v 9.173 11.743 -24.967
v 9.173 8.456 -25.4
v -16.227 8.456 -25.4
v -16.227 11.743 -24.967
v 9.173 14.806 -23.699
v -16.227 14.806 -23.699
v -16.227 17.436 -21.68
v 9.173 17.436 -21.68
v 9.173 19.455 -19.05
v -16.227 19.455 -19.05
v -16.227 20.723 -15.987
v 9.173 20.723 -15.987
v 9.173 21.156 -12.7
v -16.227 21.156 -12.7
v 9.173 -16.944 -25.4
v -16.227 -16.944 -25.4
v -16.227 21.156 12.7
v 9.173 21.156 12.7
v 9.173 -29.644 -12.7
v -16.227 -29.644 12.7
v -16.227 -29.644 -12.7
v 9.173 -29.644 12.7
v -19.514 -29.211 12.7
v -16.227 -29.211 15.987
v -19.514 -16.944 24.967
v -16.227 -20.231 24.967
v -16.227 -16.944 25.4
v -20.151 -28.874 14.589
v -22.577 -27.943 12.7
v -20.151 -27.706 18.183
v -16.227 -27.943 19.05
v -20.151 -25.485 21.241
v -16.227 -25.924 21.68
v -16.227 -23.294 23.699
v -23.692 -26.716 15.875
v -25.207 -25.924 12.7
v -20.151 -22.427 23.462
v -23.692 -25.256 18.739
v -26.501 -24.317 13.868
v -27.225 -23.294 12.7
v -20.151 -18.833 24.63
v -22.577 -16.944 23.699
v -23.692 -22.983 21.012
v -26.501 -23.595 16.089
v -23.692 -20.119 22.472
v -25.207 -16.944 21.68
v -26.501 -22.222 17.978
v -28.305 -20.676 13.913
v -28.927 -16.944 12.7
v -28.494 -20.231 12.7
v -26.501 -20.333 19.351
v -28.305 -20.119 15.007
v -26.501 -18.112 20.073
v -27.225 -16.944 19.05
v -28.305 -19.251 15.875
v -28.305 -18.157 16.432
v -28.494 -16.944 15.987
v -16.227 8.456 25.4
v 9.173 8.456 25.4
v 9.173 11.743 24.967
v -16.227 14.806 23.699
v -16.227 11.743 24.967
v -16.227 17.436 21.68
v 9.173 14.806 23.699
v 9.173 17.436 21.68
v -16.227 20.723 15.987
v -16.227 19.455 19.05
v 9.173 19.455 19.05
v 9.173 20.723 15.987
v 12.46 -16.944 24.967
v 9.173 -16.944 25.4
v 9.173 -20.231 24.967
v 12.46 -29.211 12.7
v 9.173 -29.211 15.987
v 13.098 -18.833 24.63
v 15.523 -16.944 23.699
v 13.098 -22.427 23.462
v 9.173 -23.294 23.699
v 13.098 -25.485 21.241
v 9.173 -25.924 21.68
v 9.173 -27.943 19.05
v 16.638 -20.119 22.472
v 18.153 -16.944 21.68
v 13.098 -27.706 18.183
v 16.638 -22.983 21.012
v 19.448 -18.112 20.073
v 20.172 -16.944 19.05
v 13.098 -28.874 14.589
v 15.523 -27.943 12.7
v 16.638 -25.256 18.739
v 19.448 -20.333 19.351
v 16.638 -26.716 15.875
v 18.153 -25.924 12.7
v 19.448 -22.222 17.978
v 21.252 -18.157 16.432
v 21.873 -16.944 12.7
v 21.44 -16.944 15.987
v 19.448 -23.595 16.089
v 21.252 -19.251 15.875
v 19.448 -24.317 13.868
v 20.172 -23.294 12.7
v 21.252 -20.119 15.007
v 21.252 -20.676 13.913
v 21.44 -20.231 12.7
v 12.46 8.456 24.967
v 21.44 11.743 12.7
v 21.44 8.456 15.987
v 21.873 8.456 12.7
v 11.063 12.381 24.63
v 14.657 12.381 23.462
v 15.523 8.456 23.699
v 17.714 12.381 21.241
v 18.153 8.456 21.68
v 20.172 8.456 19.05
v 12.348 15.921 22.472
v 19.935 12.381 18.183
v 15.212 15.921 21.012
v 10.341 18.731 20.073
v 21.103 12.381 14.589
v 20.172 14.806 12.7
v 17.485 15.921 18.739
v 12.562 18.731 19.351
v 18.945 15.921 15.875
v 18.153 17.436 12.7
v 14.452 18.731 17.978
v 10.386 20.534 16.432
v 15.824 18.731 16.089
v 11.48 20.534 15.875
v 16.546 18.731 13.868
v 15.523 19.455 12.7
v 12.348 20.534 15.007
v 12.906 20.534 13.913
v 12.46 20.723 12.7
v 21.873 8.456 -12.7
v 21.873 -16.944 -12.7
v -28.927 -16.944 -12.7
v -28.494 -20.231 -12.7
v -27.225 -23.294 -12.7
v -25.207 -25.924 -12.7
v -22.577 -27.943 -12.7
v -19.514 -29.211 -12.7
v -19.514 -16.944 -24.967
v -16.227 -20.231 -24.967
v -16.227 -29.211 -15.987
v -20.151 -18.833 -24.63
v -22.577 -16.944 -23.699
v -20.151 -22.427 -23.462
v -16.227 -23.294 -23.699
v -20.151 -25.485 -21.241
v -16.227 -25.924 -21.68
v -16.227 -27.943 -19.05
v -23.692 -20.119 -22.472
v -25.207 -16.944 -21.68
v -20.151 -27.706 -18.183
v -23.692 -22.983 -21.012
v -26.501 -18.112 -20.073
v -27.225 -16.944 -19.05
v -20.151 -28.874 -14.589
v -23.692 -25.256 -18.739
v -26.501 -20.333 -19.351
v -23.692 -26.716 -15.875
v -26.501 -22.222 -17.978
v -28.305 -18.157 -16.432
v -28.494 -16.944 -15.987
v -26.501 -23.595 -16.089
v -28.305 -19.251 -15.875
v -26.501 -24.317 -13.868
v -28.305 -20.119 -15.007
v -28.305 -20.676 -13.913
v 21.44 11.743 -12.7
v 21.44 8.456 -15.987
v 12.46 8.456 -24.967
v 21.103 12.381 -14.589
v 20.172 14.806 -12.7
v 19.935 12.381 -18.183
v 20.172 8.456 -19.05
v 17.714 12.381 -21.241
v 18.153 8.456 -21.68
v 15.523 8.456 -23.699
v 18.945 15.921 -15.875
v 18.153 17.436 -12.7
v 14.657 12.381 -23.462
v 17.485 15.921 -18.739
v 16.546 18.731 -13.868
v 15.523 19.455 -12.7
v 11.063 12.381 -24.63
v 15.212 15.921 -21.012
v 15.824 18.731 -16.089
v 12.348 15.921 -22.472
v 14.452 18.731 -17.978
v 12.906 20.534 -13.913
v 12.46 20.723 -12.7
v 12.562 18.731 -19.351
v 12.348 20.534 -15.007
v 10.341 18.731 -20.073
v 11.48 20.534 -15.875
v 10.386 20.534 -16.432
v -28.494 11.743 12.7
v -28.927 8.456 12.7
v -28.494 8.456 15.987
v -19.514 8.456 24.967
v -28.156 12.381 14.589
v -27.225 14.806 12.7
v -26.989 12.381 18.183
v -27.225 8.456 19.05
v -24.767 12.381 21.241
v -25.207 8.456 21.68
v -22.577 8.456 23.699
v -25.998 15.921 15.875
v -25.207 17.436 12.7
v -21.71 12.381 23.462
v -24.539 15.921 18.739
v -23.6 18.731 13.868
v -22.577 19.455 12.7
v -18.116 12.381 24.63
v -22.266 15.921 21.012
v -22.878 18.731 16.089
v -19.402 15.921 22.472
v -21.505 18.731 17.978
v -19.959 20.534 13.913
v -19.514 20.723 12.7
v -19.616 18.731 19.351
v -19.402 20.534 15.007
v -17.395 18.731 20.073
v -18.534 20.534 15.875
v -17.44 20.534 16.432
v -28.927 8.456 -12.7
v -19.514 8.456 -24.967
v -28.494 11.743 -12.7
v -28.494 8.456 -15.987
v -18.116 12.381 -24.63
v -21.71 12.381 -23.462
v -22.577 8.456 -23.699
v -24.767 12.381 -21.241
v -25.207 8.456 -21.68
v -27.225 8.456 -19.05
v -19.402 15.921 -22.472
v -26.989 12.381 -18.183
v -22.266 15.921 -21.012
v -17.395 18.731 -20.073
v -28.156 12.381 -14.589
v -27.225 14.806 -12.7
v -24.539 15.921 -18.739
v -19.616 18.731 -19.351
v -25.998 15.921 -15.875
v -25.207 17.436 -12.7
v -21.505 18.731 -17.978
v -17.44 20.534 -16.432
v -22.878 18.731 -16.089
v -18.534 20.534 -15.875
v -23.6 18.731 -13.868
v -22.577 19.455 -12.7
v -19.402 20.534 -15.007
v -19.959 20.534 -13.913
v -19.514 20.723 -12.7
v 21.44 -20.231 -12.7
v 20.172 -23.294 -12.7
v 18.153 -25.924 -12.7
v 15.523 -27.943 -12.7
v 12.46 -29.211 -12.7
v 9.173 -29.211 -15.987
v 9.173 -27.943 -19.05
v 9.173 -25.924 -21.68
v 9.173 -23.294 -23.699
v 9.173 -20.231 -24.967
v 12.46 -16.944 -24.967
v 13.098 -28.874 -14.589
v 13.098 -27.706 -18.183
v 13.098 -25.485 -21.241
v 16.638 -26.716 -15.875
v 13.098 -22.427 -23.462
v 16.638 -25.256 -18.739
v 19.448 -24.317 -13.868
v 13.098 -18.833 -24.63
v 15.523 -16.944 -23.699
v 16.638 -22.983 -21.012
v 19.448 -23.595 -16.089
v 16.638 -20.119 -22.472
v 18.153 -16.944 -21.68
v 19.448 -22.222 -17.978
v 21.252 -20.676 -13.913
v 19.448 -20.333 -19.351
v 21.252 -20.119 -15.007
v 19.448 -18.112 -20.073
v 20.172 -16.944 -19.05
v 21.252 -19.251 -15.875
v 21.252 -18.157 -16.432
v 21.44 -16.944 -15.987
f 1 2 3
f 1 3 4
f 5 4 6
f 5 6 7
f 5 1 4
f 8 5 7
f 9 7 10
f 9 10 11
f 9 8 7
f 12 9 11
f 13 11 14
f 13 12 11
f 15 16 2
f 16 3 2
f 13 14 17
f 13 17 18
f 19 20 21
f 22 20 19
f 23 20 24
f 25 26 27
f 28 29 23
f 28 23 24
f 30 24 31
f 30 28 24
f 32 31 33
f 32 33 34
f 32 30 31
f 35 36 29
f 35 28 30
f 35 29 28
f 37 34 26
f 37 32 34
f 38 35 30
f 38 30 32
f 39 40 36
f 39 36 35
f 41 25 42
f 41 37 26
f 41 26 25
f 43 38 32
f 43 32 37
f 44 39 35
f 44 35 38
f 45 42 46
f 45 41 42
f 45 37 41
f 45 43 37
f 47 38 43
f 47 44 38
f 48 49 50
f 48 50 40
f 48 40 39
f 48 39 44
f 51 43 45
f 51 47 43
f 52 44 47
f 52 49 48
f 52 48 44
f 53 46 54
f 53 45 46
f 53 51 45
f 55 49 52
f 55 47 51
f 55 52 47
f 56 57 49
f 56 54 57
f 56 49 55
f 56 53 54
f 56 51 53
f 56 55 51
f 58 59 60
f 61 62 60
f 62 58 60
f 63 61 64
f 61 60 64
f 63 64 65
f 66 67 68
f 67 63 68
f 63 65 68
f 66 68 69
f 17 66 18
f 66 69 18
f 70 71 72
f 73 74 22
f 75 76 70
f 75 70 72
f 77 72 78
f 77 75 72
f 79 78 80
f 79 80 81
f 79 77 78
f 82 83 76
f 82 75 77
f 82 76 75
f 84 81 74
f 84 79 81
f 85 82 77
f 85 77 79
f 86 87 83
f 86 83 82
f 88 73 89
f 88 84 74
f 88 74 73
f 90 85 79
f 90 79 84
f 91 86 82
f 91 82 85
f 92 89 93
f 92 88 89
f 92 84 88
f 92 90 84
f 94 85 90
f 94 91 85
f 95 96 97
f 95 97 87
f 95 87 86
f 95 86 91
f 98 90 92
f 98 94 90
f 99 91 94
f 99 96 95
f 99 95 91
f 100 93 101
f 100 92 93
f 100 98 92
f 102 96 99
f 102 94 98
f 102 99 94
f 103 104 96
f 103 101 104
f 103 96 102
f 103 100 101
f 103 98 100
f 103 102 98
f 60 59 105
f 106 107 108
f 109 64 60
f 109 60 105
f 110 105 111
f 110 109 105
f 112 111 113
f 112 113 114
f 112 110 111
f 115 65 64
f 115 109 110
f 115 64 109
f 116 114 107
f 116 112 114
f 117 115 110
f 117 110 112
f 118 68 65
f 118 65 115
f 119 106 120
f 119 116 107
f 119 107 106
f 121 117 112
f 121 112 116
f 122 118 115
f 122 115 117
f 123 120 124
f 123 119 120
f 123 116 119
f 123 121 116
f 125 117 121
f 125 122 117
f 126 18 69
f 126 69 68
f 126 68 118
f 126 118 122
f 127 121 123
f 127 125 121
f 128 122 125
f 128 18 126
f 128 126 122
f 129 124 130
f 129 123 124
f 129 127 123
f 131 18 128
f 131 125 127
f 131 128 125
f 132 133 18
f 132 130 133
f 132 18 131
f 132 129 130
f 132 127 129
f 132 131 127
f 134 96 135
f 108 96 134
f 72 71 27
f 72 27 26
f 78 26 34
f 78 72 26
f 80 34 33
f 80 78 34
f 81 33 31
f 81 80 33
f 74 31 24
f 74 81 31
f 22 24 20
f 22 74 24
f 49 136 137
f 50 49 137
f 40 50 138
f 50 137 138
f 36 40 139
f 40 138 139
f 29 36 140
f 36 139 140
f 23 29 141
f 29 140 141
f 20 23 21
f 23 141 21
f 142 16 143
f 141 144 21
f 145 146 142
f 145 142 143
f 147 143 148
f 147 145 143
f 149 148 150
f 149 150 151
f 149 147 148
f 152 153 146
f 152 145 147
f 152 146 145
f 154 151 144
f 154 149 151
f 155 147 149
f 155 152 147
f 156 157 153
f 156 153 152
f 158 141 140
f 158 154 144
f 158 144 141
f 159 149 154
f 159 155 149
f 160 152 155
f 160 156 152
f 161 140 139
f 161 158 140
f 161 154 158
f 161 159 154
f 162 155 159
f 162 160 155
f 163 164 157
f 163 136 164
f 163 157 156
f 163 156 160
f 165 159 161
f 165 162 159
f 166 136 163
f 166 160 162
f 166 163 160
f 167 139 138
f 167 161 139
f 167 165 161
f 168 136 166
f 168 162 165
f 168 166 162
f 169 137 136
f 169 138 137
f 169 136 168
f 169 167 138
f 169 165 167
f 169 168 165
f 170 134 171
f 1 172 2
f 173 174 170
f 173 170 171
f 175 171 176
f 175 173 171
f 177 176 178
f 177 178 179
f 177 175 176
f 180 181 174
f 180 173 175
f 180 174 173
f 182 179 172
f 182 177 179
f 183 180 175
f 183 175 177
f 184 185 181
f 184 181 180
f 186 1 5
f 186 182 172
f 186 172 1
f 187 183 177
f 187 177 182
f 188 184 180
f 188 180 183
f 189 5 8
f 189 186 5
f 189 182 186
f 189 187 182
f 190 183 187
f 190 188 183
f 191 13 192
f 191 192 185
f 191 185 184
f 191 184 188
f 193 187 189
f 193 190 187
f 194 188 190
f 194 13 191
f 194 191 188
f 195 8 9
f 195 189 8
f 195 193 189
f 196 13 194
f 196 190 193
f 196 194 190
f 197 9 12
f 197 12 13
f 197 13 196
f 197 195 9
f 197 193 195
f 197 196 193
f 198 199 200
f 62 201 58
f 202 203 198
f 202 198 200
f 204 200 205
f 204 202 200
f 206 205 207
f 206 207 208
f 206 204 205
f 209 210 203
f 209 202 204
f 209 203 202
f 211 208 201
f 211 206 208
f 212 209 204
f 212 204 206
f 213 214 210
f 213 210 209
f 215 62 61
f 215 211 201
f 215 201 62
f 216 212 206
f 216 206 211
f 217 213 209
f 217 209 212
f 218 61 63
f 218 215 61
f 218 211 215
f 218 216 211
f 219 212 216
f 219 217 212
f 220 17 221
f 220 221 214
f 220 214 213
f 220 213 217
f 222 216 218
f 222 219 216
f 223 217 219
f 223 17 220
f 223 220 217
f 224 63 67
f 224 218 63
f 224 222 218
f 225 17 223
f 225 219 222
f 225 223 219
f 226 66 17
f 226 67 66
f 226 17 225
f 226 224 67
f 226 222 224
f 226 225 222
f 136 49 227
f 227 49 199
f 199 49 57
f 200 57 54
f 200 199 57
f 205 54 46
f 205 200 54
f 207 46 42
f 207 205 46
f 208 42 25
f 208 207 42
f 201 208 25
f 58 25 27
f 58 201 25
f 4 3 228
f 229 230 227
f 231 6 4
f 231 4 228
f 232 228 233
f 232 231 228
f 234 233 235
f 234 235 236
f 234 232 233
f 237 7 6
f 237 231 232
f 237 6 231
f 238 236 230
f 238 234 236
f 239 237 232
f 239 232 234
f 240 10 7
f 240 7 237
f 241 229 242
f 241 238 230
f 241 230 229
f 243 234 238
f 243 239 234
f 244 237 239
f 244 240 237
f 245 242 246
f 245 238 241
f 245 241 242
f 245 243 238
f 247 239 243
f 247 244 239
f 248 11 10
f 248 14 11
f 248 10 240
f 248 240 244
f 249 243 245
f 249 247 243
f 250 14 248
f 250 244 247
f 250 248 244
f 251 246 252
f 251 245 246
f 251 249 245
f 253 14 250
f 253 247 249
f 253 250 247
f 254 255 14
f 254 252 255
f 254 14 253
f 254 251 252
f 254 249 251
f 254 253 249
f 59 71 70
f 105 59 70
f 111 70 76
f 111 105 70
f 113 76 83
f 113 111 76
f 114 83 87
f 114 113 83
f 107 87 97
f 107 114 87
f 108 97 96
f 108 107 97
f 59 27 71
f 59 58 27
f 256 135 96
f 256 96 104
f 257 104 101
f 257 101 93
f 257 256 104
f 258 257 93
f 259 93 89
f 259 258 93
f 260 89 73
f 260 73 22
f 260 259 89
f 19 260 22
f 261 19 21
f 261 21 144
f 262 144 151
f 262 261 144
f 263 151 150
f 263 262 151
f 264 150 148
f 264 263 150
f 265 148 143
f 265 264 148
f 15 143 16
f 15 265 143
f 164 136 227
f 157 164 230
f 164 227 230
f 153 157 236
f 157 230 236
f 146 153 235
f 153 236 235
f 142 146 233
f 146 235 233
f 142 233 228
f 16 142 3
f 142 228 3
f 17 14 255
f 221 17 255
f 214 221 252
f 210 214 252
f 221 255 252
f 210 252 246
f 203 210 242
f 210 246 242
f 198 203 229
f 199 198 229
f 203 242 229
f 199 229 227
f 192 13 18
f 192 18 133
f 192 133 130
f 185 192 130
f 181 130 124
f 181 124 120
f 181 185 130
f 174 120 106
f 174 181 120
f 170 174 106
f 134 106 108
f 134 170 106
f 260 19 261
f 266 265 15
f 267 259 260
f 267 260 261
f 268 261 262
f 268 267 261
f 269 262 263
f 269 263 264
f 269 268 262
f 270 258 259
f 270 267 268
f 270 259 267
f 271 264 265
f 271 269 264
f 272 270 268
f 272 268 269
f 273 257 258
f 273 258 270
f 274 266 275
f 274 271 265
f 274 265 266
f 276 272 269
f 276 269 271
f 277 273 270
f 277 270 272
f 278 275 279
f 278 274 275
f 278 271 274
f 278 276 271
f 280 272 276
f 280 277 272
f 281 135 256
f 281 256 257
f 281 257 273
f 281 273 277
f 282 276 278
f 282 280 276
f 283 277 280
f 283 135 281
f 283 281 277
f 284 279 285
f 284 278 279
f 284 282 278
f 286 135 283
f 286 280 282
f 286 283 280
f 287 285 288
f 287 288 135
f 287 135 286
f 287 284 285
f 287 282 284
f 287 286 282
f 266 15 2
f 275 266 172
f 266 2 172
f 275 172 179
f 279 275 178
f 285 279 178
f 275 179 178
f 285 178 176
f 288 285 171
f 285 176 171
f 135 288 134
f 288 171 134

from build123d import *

# Parameters (mm, degrees)
F0_W         = 50.8
F0_H         = 50.8
F1_DEPTH     = 25.4
F2_DEPTH     = 25.4
F3_R         = 12.7
F4_R         = 12.7
F5_T1_DEPTH  = 25.4
F5_S5_W      = 12.7
F5_S5_H      = 12.7
F5_T6_DEPTH  = 12.7
F5_S11_W     = 12.7
F5_S11_H     = 12.7
F5_T12_DEPTH = 12.7
F5_S17_W     = 12.7
F5_S17_H     = 12.7
F5_T18_DEPTH = 12.7
F5_S23_W     = 12.7
F5_S23_H     = 12.7
F5_T24_DEPTH = 12.7
F5_S29_W     = 12.7
F5_S29_H     = 12.7
F5_T30_DEPTH = 12.7
F5_S35_W     = 12.7
F5_S35_H     = 12.7
F5_T36_DEPTH = 12.7
F5_S41_W     = 12.7
F5_S41_H     = 12.7
F5_T42_DEPTH = 12.7
F5_S47_W     = 12.7
F5_S47_H     = 12.7
F5_T48_DEPTH = 12.7


# Not quite as in the source:
# - a fillet or chamfer that OpenCascade refuses, or shapes differently, is made with other operations: its cross-section is extruded or revolved along the edge and cut away or added


with BuildPart() as f1:
    # F0 (on Top) → F1 (new body)
    with BuildSketch(Plane.XY):
        with Locations((-3.5267624348, -4.2439938247)):
            Rectangle(F0_W, F0_H)
    extrude(amount=F1_DEPTH)

    # F2 (add): a face of the model
    f2_faces = [f1.faces().sort_by_distance(p)[0] for p in [
        (-3.5267624348, -4.2439938247, 0),
    ]]
    extrude(f2_faces, amount=F2_DEPTH)

    # F3
    f3_edges = [f1.edges().sort_by_distance(p)[0] for p in [
        (-3.526762, -29.643994, 25.4),
        (-28.926762, -4.243994, 25.4),
        (-3.526762, 21.156006, 25.4),
        (21.873238, -4.243994, 25.4),
    ]]
    fillet(f3_edges, radius=F3_R)

    # F4
    f4_edges = [f1.edges().sort_by_distance(p)[0] for p in [
        (-3.526762, -29.643994, -25.4),
        (-28.926762, -4.243994, -25.4),
        (-3.526762, 21.156006, -25.4),
        (21.873238, -4.243994, -25.4),
    ]]
    fillet(f4_edges, radius=F4_R)

    # F5: fillet of radius 12.7 on 4 edges, made by hand

    # F5_s2 → F5_t1 (cut)
    with BuildSketch(Plane.XY.offset(-12.7)):
        with BuildLine():
            ThreePointArc((-28.9267624348, -16.9439938247), (-25.2070185559, -25.9242499458), (-16.2267624348, -29.6439938247))
            Line((-16.2267624348, -29.6439938247), (-28.9267624348, -29.6439938247))
            Line((-28.9267624348, -29.6439938247), (-28.9267624348, -16.9439938247))
        make_face()
        with BuildLine():
            ThreePointArc((-16.2267624348, 21.1560061753), (-25.2070185559, 17.4362622963), (-28.9267624348, 8.4560061753))
            Line((-28.9267624348, 8.4560061753), (-28.9267624348, 21.1560061753))
            Line((-28.9267624348, 21.1560061753), (-16.2267624348, 21.1560061753))
        make_face()
        with BuildLine():
            ThreePointArc((9.1732375652, 21.1560061753), (18.1534936862, 17.4362622963), (21.8732375652, 8.4560061753))
            Line((21.8732375652, 8.4560061753), (21.8732375652, 21.1560061753))
            Line((21.8732375652, 21.1560061753), (9.1732375652, 21.1560061753))
        make_face()
        with BuildLine():
            ThreePointArc((21.8732375652, -16.9439938247), (18.1534936862, -25.9242499458), (9.1732375652, -29.6439938247))
            Line((9.1732375652, -29.6439938247), (21.8732375652, -29.6439938247))
            Line((21.8732375652, -29.6439938247), (21.8732375652, -16.9439938247))
        make_face()
    extrude(amount=F5_T1_DEPTH, mode=Mode.SUBTRACT)


with BuildPart() as f5_tool4:
    # F5_s5 → F5_t6 (new body)
    with BuildSketch(Plane.YZ.offset(9.1732375652)):
        with Locations((-23.2939938247, 19.05)):
            Rectangle(F5_S5_W, F5_S5_H)
    extrude(amount=F5_T6_DEPTH)

    # F5_s7 → F5_t8 (revolve, cut)
    with BuildSketch(Plane(origin=(9.1732375652, -16.9439938247, 12.7), x_dir=(0, 0.7071067812, -0.7071067812), z_dir=(0, -0.7071067812, -0.7071067812))):
        with BuildLine():
            ThreePointArc((0, -12.7), (12.7, 0), (0, 12.7))
            Line((0, 12.7), (0, -12.7))
        make_face()
    revolve(axis=Axis((9.1732375652, -16.9439938247, 12.7), (1, 0, 0)), mode=Mode.SUBTRACT)


with BuildPart() as f1_1:
    add(f1.part)

    # F5_t3: cut F5_tool4
    add(f5_tool4.part, mode=Mode.SUBTRACT)


with BuildPart() as f5_tool10:
    # F5_s11 → F5_t12 (new body)
    with BuildSketch(Plane.YZ.offset(9.1732375652)):
        with Locations((-23.2939938247, -19.05)):
            Rectangle(F5_S11_W, F5_S11_H)
    extrude(amount=F5_T12_DEPTH)

    # F5_s13 → F5_t14 (revolve, cut)
    with BuildSketch(Plane(origin=(9.1732375652, -16.9439938247, -12.7), x_dir=(0, 0.7071067812, 0.7071067812), z_dir=(0, 0.7071067812, -0.7071067812))):
        with BuildLine():
            ThreePointArc((0, -12.7), (12.7, 0), (0, 12.7))
            Line((0, 12.7), (0, -12.7))
        make_face()
    revolve(axis=Axis((9.1732375652, -16.9439938247, -12.7), (1, 0, 0)), mode=Mode.SUBTRACT)


with BuildPart() as f1_2:
    add(f1_1.part)

    # F5_t9: cut F5_tool10
    add(f5_tool10.part, mode=Mode.SUBTRACT)


with BuildPart() as f5_tool16:
    # F5_s17 → F5_t18 (new body)
    with BuildSketch(Plane.XZ.offset(-8.4560061753)):
        with Locations((15.5232375652, 19.05)):
            Rectangle(F5_S17_W, F5_S17_H)
    extrude(amount=-F5_T18_DEPTH)

    # F5_s19 → F5_t20 (revolve, cut)
    with BuildSketch(Plane(origin=(9.1732375652, 8.4560061753, 12.7), x_dir=(-0.7071067812, 0, -0.7071067812), z_dir=(0.7071067812, 0, -0.7071067812))):
        with BuildLine():
            ThreePointArc((0, -12.7), (12.7, 0), (0, 12.7))
            Line((0, 12.7), (0, -12.7))
        make_face()
    revolve(axis=Axis((9.1732375652, 8.4560061753, 12.7), (0, 1, 0)), mode=Mode.SUBTRACT)


with BuildPart() as f1_3:
    add(f1_2.part)

    # F5_t15: cut F5_tool16
    add(f5_tool16.part, mode=Mode.SUBTRACT)


with BuildPart() as f5_tool22:
    # F5_s23 → F5_t24 (new body)
    with BuildSketch(Plane.XZ.offset(-8.4560061753)):
        with Locations((15.5232375652, -19.05)):
            Rectangle(F5_S23_W, F5_S23_H)
    extrude(amount=-F5_T24_DEPTH)

    # F5_s25 → F5_t26 (revolve, cut)
    with BuildSketch(Plane(origin=(9.1732375652, 8.4560061753, -12.7), x_dir=(-0.7071067812, 0, 0.7071067812), z_dir=(-0.7071067812, 0, -0.7071067812))):
        with BuildLine():
            ThreePointArc((0, -12.7), (12.7, 0), (0, 12.7))
            Line((0, 12.7), (0, -12.7))
        make_face()
    revolve(axis=Axis((9.1732375652, 8.4560061753, -12.7), (0, 1, 0)), mode=Mode.SUBTRACT)


with BuildPart() as f1_4:
    add(f1_3.part)

    # F5_t21: cut F5_tool22
    add(f5_tool22.part, mode=Mode.SUBTRACT)


with BuildPart() as f5_tool28:
    # F5_s29 → F5_t30 (new body)
    with BuildSketch(Plane.XZ.offset(-8.4560061753)):
        with Locations((-22.5767624348, -19.05)):
            Rectangle(F5_S29_W, F5_S29_H)
    extrude(amount=-F5_T30_DEPTH)

    # F5_s31 → F5_t32 (revolve, cut)
    with BuildSketch(Plane(origin=(-16.2267624348, 8.4560061753, -12.7), x_dir=(0.7071067812, 0, 0.7071067812), z_dir=(-0.7071067812, 0, 0.7071067812))):
        with BuildLine():
            ThreePointArc((0, -12.7), (12.7, 0), (0, 12.7))
            Line((0, 12.7), (0, -12.7))
        make_face()
    revolve(axis=Axis((-16.2267624348, 8.4560061753, -12.7), (0, 1, 0)), mode=Mode.SUBTRACT)


with BuildPart() as f1_5:
    add(f1_4.part)

    # F5_t27: cut F5_tool28
    add(f5_tool28.part, mode=Mode.SUBTRACT)


with BuildPart() as f5_tool34:
    # F5_s35 → F5_t36 (new body)
    with BuildSketch(Plane.XZ.offset(-8.4560061753)):
        with Locations((-22.5767624348, 19.05)):
            Rectangle(F5_S35_W, F5_S35_H)
    extrude(amount=-F5_T36_DEPTH)

    # F5_s37 → F5_t38 (revolve, cut)
    with BuildSketch(Plane(origin=(-16.2267624348, 8.4560061753, 12.7), x_dir=(0.7071067812, 0, -0.7071067812), z_dir=(0.7071067812, 0, 0.7071067812))):
        with BuildLine():
            ThreePointArc((0, -12.7), (12.7, 0), (0, 12.7))
            Line((0, 12.7), (0, -12.7))
        make_face()
    revolve(axis=Axis((-16.2267624348, 8.4560061753, 12.7), (0, 1, 0)), mode=Mode.SUBTRACT)


with BuildPart() as f1_6:
    add(f1_5.part)

    # F5_t33: cut F5_tool34
    add(f5_tool34.part, mode=Mode.SUBTRACT)


with BuildPart() as f5_tool40:
    # F5_s41 → F5_t42 (new body)
    with BuildSketch(Plane.YZ.offset(-16.2267624348)):
        with Locations((-23.2939938247, -19.05)):
            Rectangle(F5_S41_W, F5_S41_H)
    extrude(amount=-F5_T42_DEPTH)

    # F5_s43 → F5_t44 (revolve, cut)
    with BuildSketch(Plane(origin=(-16.2267624348, -16.9439938247, -12.7), x_dir=(0, 0.7071067812, 0.7071067812), z_dir=(0, -0.7071067812, 0.7071067812))):
        with BuildLine():
            ThreePointArc((0, -12.7), (12.7, 0), (0, 12.7))
            Line((0, 12.7), (0, -12.7))
        make_face()
    revolve(axis=Axis((-16.2267624348, -16.9439938247, -12.7), (-1, 0, 0)), mode=Mode.SUBTRACT)


with BuildPart() as f1_7:
    add(f1_6.part)

    # F5_t39: cut F5_tool40
    add(f5_tool40.part, mode=Mode.SUBTRACT)


with BuildPart() as f5_tool46:
    # F5_s47 → F5_t48 (new body)
    with BuildSketch(Plane.YZ.offset(-16.2267624348)):
        with Locations((-23.2939938247, 19.05)):
            Rectangle(F5_S47_W, F5_S47_H)
    extrude(amount=-F5_T48_DEPTH)

    # F5_s49 → F5_t50 (revolve, cut)
    with BuildSketch(Plane(origin=(-16.2267624348, -16.9439938247, 12.7), x_dir=(0, 0.7071067812, -0.7071067812), z_dir=(0, 0.7071067812, 0.7071067812))):
        with BuildLine():
            ThreePointArc((0, -12.7), (12.7, 0), (0, 12.7))
            Line((0, 12.7), (0, -12.7))
        make_face()
    revolve(axis=Axis((-16.2267624348, -16.9439938247, 12.7), (-1, 0, 0)), mode=Mode.SUBTRACT)


with BuildPart() as f1_8:
    add(f1_7.part)

    # F5_t45: cut F5_tool46
    add(f5_tool46.part, mode=Mode.SUBTRACT)


solid = f1_8.part
